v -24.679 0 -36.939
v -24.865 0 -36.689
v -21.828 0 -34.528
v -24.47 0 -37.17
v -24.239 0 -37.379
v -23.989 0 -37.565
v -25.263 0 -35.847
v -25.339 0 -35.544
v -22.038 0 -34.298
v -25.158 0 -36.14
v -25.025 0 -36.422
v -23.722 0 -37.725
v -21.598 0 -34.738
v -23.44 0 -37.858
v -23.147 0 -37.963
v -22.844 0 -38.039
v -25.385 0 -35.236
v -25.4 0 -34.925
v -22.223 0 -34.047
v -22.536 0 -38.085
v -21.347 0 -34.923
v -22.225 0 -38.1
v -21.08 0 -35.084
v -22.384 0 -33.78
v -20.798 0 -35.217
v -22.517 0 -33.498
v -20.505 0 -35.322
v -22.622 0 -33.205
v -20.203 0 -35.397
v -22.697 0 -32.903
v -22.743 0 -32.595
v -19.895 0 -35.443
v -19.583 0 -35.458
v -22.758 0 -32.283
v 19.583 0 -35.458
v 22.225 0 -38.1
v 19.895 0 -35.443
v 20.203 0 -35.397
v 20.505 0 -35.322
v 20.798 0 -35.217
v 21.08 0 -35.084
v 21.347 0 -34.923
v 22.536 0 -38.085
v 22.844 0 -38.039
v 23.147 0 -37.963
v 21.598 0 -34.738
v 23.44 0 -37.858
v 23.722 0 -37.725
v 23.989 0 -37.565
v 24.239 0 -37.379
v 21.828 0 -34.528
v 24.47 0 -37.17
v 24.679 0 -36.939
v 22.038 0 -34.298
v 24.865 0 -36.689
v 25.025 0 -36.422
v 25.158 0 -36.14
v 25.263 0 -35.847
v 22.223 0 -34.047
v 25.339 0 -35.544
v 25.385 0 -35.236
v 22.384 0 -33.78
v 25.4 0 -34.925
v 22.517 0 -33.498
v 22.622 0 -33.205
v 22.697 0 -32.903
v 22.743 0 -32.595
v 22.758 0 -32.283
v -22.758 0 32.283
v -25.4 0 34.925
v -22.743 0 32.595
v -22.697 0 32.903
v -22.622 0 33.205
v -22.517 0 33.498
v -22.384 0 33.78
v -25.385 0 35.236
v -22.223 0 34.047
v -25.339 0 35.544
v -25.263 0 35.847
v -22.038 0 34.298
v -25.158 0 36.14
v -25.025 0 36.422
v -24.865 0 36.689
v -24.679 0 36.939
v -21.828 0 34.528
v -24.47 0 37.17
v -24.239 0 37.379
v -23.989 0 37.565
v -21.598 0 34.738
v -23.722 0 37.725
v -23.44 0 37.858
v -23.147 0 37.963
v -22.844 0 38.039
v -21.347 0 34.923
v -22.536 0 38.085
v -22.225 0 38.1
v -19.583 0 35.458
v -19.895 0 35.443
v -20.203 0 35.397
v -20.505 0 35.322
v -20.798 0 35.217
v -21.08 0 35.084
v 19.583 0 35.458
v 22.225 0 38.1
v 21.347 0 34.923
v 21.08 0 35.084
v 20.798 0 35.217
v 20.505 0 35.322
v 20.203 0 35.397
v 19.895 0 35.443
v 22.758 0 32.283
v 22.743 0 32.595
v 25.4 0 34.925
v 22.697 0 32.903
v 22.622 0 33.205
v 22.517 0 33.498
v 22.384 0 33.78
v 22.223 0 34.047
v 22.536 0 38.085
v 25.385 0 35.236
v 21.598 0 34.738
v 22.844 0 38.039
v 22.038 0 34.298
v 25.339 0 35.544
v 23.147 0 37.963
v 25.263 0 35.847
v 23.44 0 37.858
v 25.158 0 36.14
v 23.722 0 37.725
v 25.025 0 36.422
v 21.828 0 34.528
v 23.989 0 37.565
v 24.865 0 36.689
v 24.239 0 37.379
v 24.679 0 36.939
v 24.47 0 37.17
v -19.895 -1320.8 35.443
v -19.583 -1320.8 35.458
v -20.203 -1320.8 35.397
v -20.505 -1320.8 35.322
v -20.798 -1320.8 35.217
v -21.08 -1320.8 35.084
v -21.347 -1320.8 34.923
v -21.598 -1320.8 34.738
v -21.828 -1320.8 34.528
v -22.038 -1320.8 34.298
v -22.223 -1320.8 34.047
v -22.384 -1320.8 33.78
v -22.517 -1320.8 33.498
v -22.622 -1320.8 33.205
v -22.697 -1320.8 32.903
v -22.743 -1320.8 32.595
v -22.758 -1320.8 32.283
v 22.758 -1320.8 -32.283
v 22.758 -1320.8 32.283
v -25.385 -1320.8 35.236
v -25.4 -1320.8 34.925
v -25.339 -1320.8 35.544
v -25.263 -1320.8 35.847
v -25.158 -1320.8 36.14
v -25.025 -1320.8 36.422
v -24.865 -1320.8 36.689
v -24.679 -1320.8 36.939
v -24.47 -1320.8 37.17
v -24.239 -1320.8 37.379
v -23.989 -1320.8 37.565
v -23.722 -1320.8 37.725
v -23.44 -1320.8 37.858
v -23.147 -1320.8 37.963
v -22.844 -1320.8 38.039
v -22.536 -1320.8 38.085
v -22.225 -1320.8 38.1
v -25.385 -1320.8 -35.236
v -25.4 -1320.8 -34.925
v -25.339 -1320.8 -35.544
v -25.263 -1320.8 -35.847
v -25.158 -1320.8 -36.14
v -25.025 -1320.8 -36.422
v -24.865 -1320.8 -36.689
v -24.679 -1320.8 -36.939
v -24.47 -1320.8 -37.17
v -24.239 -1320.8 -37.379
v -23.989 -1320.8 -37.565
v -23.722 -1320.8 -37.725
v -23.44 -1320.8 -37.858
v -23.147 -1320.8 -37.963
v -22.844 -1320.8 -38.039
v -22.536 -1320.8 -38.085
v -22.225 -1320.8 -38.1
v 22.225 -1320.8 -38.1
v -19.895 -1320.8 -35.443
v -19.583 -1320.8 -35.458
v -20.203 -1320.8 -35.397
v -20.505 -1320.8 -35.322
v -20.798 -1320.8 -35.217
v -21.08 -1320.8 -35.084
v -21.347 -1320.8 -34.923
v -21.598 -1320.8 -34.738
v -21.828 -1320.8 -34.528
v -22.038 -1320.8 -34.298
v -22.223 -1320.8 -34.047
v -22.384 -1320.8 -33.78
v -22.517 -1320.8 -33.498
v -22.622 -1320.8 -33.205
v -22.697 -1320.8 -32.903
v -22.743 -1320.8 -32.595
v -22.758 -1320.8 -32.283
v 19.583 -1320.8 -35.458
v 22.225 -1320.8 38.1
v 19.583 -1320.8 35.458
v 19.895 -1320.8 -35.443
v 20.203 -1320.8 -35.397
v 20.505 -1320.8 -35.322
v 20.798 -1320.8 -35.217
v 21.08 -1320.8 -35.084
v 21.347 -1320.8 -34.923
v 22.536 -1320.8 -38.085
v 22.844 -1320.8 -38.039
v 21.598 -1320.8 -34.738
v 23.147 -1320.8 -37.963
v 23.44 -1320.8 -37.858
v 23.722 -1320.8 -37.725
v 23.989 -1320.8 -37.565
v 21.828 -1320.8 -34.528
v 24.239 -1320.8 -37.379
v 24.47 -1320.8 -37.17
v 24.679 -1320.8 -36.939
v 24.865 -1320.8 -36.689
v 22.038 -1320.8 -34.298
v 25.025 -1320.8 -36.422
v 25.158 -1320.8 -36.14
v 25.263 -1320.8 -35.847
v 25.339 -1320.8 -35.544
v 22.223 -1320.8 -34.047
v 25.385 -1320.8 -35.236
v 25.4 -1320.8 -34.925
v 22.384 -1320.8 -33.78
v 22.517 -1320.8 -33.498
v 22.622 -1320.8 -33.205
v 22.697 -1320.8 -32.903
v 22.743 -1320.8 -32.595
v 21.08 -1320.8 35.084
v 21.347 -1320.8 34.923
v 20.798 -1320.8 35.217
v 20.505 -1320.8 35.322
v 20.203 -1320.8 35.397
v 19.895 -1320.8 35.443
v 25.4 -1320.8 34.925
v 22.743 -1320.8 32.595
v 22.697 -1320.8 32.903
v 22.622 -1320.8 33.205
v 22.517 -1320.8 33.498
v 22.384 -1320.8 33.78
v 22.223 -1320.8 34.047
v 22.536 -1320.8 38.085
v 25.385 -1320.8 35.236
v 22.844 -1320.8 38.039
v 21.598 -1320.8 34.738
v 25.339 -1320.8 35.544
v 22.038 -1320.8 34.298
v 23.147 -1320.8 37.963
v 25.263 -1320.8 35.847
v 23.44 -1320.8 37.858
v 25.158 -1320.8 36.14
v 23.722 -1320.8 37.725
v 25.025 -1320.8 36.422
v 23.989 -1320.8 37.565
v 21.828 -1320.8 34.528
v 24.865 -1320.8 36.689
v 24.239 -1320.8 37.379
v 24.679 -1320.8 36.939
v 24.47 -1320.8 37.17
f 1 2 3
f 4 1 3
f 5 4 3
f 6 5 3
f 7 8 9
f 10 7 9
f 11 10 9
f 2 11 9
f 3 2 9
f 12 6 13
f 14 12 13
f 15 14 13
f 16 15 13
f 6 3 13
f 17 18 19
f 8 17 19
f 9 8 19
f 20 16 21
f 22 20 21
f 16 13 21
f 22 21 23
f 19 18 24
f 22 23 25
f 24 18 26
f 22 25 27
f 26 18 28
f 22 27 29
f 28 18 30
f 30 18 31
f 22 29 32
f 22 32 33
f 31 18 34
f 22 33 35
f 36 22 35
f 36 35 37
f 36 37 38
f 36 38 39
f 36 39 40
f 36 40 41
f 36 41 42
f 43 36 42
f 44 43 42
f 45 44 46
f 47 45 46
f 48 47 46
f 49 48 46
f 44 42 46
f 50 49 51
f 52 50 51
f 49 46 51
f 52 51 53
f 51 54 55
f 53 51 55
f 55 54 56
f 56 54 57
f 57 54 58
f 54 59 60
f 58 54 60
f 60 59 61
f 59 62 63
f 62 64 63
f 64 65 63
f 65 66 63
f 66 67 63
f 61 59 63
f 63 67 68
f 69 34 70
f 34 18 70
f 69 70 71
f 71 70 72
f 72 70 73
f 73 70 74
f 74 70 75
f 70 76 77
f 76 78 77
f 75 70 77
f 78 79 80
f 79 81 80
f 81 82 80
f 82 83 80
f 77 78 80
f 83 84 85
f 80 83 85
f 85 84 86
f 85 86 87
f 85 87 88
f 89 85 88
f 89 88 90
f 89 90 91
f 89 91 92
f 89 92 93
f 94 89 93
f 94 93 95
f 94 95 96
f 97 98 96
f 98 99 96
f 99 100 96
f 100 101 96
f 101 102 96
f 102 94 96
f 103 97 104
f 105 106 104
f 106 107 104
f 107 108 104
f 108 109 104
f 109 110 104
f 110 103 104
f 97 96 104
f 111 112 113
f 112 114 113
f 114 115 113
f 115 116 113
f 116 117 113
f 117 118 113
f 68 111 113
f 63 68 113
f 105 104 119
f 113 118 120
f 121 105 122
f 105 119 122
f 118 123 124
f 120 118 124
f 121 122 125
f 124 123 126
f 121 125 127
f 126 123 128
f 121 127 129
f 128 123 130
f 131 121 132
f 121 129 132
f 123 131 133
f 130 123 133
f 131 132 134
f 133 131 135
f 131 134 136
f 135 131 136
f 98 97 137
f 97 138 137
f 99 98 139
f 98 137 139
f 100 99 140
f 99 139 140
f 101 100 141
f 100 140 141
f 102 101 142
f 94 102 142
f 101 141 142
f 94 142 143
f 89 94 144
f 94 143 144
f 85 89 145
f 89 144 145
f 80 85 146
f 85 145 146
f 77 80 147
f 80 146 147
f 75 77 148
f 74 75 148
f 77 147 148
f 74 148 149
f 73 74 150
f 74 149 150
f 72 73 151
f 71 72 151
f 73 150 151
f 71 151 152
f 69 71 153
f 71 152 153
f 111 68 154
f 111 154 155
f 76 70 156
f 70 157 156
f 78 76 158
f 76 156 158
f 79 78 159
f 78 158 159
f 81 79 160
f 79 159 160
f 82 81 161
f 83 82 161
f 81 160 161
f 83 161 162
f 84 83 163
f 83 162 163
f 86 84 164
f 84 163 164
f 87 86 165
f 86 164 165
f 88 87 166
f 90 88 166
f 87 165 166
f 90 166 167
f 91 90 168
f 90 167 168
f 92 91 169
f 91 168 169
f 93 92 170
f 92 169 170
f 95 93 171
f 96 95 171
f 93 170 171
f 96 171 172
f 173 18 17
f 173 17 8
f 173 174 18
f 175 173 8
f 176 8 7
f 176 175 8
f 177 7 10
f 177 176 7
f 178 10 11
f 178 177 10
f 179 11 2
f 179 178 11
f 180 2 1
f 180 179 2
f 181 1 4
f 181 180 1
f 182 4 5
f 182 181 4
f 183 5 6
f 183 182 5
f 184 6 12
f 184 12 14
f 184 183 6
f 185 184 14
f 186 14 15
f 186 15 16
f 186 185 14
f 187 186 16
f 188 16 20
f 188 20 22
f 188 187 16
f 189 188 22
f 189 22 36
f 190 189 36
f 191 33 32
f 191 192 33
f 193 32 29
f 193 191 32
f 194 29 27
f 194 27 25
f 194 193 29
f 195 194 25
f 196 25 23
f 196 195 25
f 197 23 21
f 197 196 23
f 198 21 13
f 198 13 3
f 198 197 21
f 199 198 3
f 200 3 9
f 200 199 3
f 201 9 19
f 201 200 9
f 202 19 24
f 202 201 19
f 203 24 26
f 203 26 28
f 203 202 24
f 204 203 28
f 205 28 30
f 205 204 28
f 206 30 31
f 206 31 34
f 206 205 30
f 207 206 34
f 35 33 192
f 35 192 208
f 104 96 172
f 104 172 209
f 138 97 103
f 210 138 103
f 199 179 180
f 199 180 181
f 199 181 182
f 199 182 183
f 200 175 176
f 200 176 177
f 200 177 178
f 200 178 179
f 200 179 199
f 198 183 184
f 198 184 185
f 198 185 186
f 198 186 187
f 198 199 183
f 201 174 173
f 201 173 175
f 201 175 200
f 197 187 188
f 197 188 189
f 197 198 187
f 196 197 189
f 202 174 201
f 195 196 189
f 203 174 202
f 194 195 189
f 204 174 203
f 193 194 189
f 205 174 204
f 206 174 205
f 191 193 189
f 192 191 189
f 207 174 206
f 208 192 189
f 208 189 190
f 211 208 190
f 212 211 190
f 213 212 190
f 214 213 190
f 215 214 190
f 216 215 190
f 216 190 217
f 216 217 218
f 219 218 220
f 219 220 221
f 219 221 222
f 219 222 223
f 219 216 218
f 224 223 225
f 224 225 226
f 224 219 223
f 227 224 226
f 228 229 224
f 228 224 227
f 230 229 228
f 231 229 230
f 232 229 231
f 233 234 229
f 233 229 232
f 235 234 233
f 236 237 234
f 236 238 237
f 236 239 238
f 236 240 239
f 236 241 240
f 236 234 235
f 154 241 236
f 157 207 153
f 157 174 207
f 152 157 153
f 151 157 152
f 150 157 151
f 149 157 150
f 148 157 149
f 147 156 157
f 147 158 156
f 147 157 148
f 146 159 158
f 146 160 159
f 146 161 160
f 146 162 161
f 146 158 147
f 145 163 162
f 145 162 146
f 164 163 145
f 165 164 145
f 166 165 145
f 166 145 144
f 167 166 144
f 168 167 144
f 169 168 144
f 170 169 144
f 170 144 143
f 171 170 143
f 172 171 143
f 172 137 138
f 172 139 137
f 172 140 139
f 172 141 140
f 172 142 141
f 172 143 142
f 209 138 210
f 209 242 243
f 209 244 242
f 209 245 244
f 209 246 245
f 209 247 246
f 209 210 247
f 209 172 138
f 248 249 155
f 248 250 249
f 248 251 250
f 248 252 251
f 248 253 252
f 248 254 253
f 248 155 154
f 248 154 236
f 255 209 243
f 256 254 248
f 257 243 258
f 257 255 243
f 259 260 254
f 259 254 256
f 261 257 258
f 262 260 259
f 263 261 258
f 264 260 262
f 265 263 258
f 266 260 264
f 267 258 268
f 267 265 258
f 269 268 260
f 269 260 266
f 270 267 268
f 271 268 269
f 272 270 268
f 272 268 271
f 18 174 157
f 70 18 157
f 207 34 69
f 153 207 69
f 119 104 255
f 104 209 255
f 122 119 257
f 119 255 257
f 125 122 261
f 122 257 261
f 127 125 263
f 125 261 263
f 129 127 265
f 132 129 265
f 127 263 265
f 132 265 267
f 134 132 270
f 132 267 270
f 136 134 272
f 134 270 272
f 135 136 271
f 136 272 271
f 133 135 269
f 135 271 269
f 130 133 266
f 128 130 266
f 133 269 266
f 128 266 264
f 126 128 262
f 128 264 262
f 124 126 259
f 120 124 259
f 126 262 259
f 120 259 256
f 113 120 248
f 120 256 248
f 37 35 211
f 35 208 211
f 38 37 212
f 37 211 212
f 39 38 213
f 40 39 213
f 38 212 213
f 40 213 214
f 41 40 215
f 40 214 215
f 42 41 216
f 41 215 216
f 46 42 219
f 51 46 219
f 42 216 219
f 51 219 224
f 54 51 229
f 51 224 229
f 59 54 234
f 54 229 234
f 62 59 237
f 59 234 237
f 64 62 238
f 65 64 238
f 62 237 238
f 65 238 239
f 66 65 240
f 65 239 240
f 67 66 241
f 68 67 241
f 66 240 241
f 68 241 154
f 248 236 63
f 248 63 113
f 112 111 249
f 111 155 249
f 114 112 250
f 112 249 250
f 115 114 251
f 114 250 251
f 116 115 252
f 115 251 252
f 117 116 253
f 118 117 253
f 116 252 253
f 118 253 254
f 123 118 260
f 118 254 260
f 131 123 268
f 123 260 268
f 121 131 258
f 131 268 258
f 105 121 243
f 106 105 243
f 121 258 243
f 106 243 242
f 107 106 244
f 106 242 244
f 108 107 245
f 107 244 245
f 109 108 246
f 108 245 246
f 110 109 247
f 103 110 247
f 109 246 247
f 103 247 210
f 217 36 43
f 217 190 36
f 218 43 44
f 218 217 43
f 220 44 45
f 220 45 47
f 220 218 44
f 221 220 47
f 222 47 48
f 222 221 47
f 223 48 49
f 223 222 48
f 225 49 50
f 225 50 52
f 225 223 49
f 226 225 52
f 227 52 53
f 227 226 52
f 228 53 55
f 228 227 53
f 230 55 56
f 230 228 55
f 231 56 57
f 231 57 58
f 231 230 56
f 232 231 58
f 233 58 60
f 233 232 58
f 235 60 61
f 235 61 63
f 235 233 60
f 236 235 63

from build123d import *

# Parameters (mm, degrees)
F0_W     = 50.8
F0_H     = 76.2
F0_W_2   = 45.5168
F0_H_2   = 70.9168
F1_DEPTH = 1320.8
F2_R     = 3.175


with BuildPart() as f1:
    # F0 (on Front) → F1 (new body)
    with BuildSketch(Plane.XZ):
        Rectangle(F0_W, F0_H)
        Rectangle(F0_W_2, F0_H_2, mode=Mode.SUBTRACT)
    extrude(amount=F1_DEPTH)

    # F2
    f2_edges = [f1.edges().sort_by_distance(p)[0] for p in [
        (25.4, -660.4, 38.1),
        (-25.4, -660.4, 38.1),
        (25.4, -660.4, -38.1),
        (-22.7584, -660.4, -35.4584),
        (-25.4, -660.4, -38.1),
        (22.7584, -660.4, 35.4584),
        (22.7584, -660.4, -35.4584),
        (-22.7584, -660.4, 35.4584),
    ]]
    fillet(f2_edges, radius=F2_R)


solid = f1.part
